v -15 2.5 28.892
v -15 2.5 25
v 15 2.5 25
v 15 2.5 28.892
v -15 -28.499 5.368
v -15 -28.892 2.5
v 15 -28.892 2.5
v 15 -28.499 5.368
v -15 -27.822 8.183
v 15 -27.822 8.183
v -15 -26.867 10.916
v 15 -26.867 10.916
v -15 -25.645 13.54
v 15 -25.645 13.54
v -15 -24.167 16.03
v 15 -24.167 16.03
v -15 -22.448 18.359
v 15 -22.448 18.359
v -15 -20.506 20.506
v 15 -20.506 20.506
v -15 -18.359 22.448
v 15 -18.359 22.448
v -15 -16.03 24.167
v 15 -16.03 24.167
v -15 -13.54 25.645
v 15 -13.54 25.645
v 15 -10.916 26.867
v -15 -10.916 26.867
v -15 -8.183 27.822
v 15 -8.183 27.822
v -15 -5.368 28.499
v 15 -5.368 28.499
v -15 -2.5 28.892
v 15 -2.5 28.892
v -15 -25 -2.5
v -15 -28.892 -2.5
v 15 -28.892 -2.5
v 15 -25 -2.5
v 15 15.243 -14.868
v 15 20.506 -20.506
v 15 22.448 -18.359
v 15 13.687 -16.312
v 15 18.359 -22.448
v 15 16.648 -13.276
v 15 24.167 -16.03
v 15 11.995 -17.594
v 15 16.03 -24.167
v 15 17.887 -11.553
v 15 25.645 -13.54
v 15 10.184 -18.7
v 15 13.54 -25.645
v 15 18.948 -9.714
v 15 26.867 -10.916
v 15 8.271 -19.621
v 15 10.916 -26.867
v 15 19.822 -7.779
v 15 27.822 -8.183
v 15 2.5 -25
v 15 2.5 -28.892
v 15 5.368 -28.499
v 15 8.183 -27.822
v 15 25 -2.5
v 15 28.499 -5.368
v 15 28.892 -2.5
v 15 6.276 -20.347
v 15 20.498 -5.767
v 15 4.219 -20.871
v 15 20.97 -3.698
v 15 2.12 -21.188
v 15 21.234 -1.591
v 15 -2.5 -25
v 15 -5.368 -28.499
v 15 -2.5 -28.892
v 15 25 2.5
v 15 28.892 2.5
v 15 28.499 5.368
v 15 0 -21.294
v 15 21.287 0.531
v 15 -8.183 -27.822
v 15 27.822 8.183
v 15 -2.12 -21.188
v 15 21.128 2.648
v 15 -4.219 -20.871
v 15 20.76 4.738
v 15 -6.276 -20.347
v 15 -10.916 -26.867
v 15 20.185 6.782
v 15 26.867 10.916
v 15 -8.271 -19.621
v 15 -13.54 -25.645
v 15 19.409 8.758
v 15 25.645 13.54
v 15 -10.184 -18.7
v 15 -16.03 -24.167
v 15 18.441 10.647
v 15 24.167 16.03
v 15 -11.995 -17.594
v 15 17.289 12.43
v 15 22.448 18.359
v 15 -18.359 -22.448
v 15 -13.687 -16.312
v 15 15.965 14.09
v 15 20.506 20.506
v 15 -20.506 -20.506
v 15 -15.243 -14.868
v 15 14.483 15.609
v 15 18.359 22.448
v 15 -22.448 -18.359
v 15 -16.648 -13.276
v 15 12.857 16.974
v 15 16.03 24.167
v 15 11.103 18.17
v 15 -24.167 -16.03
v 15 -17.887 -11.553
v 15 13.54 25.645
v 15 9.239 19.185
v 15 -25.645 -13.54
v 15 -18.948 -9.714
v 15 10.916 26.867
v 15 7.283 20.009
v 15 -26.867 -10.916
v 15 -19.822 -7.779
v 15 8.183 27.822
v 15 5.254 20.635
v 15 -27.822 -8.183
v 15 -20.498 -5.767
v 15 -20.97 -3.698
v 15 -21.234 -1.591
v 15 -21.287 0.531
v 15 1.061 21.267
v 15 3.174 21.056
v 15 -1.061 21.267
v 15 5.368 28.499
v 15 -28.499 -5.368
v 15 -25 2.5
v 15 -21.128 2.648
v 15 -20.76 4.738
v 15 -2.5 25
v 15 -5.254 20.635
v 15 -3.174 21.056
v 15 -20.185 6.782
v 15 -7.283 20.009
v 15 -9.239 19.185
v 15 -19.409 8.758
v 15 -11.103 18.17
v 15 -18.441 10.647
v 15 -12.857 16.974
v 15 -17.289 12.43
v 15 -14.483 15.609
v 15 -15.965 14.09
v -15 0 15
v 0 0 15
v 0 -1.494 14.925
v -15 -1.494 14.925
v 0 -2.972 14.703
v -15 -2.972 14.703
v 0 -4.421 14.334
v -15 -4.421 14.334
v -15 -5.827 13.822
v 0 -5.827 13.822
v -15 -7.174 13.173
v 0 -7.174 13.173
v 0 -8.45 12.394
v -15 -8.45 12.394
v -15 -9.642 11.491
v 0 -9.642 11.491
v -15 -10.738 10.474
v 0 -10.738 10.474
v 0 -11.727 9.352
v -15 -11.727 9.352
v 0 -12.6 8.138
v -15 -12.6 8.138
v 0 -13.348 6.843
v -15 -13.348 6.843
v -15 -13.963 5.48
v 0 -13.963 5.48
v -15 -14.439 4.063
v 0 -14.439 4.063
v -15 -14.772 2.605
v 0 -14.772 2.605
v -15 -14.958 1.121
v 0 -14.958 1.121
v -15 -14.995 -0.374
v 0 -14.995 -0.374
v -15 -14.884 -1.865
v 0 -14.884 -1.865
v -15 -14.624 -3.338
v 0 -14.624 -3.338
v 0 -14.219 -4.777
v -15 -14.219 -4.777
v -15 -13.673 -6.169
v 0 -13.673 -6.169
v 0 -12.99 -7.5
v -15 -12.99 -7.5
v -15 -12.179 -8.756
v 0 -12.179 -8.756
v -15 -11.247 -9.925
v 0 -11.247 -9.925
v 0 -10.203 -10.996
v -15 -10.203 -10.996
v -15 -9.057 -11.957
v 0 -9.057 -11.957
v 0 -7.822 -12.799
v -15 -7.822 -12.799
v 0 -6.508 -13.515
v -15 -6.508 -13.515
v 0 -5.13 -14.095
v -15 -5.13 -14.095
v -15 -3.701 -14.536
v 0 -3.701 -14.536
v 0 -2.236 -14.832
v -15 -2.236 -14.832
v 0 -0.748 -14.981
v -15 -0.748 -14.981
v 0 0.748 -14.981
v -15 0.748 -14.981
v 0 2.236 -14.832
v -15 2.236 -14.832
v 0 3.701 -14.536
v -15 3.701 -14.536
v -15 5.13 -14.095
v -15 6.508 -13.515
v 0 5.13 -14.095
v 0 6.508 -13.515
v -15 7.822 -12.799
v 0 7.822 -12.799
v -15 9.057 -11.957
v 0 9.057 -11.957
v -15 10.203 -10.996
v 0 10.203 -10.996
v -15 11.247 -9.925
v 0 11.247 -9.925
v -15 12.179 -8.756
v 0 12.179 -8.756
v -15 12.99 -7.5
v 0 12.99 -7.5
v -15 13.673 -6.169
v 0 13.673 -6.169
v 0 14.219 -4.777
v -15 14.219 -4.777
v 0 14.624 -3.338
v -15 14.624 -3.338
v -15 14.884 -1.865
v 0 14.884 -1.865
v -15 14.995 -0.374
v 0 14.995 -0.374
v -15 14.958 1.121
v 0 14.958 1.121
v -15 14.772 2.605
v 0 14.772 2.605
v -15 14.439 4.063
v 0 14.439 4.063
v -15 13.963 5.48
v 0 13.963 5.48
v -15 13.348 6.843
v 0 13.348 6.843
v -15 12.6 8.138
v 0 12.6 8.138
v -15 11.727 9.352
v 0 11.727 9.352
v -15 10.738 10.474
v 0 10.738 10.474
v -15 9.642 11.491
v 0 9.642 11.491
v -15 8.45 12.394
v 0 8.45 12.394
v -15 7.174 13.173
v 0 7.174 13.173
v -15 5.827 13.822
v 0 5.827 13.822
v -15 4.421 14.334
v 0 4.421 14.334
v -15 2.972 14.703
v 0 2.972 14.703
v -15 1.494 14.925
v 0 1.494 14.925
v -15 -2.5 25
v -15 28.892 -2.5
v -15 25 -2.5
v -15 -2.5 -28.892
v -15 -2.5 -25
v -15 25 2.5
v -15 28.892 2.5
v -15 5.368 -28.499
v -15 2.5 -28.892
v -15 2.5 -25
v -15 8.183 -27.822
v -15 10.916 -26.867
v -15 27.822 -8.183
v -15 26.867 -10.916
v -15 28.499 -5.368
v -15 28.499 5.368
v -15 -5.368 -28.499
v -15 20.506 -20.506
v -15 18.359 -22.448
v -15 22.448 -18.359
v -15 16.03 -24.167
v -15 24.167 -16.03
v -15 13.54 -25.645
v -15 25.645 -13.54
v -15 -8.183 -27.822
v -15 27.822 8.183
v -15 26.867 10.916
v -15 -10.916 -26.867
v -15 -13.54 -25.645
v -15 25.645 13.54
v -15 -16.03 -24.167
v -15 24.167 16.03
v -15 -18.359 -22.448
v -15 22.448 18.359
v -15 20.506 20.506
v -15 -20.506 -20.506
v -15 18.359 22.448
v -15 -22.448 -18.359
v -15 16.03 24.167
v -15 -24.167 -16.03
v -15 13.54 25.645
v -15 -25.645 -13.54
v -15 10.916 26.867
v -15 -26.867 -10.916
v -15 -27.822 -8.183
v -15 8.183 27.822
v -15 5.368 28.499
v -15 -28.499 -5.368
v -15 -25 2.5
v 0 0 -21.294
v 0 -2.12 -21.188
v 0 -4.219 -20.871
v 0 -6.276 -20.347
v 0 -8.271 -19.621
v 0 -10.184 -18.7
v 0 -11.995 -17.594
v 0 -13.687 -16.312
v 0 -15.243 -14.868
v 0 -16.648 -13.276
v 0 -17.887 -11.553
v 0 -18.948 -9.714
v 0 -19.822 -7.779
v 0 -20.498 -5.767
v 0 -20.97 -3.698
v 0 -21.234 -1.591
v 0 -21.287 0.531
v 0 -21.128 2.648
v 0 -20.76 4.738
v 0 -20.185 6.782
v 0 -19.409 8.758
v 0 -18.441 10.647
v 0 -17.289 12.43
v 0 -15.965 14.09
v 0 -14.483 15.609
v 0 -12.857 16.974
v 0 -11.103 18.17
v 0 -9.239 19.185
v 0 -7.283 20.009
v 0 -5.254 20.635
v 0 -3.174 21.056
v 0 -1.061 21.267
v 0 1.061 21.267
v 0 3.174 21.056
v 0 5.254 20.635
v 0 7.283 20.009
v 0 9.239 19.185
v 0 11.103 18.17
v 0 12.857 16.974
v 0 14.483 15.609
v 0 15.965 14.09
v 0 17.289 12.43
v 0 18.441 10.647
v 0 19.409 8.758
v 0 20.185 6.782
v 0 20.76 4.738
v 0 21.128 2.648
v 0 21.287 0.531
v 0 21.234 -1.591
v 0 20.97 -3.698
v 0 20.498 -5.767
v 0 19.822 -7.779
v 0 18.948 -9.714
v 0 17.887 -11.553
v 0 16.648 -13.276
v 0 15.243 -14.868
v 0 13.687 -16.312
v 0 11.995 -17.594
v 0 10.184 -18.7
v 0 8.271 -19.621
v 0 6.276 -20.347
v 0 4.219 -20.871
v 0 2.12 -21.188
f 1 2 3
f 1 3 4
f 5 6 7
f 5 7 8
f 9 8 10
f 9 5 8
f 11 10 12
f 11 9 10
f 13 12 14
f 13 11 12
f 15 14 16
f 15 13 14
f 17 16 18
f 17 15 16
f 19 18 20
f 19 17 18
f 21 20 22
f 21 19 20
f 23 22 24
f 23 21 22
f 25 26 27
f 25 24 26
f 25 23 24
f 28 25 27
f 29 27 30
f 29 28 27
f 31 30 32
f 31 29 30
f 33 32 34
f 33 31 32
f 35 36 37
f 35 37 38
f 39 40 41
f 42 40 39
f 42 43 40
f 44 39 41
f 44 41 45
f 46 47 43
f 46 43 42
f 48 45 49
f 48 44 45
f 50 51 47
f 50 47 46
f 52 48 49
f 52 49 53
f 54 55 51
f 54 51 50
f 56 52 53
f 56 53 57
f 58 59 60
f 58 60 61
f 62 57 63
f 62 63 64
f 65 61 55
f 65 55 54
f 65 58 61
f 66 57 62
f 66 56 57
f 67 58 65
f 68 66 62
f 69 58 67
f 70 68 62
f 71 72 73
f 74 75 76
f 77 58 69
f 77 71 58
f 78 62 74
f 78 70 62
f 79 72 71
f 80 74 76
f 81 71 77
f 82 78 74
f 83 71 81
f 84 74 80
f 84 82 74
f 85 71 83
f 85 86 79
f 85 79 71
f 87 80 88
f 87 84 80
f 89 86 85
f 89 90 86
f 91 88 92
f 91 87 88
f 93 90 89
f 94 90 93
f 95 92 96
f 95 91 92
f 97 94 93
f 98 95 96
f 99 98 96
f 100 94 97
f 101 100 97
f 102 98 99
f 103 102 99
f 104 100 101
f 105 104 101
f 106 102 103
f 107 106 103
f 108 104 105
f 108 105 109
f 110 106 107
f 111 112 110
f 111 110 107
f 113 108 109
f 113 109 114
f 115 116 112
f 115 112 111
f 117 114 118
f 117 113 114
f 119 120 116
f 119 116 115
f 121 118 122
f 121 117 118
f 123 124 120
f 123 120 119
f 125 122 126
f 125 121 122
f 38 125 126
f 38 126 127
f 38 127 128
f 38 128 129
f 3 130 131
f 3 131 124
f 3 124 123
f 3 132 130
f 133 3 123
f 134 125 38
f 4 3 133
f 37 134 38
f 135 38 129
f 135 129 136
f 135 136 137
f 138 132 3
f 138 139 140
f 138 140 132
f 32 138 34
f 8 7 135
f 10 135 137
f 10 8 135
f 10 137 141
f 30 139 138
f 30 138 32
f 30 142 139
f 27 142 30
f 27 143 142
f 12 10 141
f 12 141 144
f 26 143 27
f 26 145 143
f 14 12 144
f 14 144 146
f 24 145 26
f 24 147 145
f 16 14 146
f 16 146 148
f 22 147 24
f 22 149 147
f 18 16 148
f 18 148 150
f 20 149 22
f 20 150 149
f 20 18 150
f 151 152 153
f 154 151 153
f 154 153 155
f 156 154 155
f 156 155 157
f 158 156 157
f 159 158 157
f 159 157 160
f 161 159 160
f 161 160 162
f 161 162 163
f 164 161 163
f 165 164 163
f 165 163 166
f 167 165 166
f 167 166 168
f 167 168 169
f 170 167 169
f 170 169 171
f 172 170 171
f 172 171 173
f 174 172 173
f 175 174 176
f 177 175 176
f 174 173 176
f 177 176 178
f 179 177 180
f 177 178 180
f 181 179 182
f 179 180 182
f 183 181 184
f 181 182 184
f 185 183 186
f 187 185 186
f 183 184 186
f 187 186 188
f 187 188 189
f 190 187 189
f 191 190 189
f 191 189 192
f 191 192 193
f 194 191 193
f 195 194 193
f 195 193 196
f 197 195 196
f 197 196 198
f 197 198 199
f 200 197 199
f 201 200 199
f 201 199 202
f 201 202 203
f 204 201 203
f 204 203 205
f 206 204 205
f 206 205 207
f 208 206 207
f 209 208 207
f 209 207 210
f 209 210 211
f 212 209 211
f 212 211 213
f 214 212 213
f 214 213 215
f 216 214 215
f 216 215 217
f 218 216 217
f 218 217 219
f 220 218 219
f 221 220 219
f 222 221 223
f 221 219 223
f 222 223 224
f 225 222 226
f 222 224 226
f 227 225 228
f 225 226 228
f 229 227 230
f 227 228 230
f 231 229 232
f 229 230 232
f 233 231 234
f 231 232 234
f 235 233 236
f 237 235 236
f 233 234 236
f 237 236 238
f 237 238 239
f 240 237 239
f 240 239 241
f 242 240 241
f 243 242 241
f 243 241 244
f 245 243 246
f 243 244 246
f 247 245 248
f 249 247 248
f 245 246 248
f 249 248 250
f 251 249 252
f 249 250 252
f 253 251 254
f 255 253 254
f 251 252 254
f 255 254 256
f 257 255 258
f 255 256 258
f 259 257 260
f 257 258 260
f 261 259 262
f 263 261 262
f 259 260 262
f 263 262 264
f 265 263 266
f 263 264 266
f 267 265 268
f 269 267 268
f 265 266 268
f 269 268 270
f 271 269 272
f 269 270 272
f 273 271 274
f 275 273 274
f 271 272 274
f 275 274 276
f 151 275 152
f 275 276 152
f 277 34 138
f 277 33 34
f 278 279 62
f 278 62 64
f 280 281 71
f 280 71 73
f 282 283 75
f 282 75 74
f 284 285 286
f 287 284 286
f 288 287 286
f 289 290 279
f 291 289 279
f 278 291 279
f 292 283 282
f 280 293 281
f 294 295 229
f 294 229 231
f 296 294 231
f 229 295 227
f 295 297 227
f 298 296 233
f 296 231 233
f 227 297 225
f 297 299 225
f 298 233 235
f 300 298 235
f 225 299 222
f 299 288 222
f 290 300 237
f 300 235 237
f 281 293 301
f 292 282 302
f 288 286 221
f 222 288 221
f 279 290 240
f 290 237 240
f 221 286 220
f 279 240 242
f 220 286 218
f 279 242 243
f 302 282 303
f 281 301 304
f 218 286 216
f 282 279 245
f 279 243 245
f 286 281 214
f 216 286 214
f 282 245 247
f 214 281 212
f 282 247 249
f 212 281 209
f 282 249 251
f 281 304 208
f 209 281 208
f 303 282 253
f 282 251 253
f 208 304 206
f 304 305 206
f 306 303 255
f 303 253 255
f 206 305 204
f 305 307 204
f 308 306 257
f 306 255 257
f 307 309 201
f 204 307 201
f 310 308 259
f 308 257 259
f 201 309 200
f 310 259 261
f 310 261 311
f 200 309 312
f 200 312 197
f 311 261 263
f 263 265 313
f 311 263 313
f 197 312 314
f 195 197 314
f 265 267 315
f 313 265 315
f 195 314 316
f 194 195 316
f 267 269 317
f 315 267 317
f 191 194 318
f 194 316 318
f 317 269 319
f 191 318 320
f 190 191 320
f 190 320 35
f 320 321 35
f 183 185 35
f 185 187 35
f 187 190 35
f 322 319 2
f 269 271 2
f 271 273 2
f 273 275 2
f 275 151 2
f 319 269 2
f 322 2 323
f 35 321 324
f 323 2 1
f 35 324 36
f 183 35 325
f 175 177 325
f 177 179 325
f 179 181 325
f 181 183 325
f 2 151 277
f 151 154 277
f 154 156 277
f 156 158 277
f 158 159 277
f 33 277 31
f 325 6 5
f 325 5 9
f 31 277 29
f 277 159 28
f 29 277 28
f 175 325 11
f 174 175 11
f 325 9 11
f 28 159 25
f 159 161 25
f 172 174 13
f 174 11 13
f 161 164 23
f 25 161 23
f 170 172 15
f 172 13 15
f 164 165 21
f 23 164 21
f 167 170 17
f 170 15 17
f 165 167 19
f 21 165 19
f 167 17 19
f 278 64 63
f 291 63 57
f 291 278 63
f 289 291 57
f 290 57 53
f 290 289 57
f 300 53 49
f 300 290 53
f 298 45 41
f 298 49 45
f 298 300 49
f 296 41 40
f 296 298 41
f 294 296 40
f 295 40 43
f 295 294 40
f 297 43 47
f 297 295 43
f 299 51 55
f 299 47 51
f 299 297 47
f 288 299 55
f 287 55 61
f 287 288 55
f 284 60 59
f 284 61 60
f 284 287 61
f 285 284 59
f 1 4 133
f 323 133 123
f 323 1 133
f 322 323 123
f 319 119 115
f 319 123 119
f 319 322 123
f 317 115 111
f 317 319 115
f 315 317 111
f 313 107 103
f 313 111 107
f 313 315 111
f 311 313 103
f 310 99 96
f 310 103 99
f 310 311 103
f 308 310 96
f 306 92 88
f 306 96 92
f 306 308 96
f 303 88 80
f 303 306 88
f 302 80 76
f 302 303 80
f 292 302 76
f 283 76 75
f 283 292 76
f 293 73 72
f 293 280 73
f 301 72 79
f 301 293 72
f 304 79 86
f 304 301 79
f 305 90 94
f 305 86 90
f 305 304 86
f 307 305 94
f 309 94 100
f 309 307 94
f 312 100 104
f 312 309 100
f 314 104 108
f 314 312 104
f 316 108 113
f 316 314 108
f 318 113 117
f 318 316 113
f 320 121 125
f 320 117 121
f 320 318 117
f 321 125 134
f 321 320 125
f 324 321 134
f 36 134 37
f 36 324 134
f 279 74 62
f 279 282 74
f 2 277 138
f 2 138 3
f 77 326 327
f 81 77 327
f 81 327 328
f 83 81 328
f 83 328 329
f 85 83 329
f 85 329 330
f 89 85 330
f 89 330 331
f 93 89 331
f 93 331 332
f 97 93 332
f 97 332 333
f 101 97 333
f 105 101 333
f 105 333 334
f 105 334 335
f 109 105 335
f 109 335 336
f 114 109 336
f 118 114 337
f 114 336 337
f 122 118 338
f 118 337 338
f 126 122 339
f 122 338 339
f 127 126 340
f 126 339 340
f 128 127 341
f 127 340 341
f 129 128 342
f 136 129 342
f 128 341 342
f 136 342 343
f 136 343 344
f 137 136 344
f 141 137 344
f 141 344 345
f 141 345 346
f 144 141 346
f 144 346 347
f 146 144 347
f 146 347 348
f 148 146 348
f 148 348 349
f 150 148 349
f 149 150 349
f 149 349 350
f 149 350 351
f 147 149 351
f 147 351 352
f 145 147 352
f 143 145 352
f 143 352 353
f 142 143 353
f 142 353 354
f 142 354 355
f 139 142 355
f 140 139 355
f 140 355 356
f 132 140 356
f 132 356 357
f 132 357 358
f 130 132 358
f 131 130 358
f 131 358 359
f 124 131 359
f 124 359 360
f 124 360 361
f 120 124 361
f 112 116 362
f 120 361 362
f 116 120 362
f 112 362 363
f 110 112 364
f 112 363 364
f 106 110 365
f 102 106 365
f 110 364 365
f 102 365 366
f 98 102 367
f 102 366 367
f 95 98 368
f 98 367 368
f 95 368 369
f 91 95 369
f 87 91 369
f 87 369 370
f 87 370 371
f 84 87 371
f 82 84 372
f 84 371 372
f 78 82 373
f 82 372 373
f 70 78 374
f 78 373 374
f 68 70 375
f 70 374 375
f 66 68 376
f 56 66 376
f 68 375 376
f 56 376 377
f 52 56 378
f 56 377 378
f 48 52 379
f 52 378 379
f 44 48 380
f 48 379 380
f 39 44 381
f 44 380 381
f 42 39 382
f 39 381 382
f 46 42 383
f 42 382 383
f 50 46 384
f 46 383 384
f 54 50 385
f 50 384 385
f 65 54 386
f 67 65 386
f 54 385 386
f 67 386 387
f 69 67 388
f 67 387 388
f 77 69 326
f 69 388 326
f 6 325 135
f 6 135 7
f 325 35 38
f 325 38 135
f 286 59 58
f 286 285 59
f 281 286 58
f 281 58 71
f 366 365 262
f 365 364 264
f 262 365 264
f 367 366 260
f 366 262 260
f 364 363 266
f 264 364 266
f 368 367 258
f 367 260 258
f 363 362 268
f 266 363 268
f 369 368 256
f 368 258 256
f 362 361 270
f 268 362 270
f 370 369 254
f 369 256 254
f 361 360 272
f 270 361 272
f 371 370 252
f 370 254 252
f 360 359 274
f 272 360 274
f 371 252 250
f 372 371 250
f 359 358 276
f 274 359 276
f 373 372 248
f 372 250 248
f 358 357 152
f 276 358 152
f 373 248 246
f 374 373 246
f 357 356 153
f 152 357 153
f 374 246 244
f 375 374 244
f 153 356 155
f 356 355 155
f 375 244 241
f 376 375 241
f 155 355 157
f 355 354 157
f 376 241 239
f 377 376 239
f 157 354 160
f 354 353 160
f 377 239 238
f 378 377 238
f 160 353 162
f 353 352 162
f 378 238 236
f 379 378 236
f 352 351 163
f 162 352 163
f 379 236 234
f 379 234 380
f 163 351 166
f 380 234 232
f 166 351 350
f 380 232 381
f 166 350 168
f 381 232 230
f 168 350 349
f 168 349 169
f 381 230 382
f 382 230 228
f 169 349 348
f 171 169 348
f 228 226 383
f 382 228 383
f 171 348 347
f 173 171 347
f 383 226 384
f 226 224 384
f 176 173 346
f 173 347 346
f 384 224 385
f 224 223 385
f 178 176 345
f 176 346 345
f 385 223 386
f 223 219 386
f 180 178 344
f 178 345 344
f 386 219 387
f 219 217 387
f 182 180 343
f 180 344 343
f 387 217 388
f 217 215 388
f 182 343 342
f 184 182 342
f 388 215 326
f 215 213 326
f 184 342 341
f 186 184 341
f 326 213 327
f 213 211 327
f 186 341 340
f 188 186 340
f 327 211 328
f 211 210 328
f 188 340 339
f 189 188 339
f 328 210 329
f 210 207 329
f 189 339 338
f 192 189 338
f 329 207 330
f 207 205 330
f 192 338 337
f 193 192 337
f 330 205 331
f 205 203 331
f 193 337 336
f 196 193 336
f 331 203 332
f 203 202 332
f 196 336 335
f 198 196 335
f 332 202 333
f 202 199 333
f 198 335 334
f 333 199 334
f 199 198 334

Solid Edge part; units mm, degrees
sketch "Sketch1" plane through (0, 0, 0) normal (0, -1, 0) x (1, 0, 0)
  line L0 (-15, 15) -> (15, 15)
  line L1 (15, 15) -> (15, 29)
  line L2 (15, 29) -> (-15, 29)
  line L3 (-15, 29) -> (-15, 15)
  dimension "D1" = 29
  dimension "D2" = 15
  dimension "D3" = 30
revolve "RevolvedProtrusion1" add sketch "Sketch1" angle 360 about axis through (-60, 0, 0) along (1, 0, 0)
hole "Hole_1" at (15, 0, 0) direction (-1, 0, 0) diameter 42.587 depth 15 thread major 48 thread length 2
sketch "Sketch2" plane through (-15, 0, 0) normal (-1, 0, 0) x (0, -1, 0)
  line L0 (-2.5, 30) -> (2.5, 30)
  line L1 (2.5, 30) -> (2.5, 25)
  line L2 (2.5, 25) -> (-2.5, 25)
  line L3 (-2.5, 25) -> (-2.5, 30)
  dimension "D1" = 5
  dimension "D2" = 5
  dimension "D3" = 30
extrude "ExtrudedCutout_1" cut sketch "Sketch2" against normal blind 85.8062
pattern_circular "Pattern1" count 4 over 360 about axis through (-15, 0, 0) along (1, 0, 0) of "ExtrudedCutout_1"
